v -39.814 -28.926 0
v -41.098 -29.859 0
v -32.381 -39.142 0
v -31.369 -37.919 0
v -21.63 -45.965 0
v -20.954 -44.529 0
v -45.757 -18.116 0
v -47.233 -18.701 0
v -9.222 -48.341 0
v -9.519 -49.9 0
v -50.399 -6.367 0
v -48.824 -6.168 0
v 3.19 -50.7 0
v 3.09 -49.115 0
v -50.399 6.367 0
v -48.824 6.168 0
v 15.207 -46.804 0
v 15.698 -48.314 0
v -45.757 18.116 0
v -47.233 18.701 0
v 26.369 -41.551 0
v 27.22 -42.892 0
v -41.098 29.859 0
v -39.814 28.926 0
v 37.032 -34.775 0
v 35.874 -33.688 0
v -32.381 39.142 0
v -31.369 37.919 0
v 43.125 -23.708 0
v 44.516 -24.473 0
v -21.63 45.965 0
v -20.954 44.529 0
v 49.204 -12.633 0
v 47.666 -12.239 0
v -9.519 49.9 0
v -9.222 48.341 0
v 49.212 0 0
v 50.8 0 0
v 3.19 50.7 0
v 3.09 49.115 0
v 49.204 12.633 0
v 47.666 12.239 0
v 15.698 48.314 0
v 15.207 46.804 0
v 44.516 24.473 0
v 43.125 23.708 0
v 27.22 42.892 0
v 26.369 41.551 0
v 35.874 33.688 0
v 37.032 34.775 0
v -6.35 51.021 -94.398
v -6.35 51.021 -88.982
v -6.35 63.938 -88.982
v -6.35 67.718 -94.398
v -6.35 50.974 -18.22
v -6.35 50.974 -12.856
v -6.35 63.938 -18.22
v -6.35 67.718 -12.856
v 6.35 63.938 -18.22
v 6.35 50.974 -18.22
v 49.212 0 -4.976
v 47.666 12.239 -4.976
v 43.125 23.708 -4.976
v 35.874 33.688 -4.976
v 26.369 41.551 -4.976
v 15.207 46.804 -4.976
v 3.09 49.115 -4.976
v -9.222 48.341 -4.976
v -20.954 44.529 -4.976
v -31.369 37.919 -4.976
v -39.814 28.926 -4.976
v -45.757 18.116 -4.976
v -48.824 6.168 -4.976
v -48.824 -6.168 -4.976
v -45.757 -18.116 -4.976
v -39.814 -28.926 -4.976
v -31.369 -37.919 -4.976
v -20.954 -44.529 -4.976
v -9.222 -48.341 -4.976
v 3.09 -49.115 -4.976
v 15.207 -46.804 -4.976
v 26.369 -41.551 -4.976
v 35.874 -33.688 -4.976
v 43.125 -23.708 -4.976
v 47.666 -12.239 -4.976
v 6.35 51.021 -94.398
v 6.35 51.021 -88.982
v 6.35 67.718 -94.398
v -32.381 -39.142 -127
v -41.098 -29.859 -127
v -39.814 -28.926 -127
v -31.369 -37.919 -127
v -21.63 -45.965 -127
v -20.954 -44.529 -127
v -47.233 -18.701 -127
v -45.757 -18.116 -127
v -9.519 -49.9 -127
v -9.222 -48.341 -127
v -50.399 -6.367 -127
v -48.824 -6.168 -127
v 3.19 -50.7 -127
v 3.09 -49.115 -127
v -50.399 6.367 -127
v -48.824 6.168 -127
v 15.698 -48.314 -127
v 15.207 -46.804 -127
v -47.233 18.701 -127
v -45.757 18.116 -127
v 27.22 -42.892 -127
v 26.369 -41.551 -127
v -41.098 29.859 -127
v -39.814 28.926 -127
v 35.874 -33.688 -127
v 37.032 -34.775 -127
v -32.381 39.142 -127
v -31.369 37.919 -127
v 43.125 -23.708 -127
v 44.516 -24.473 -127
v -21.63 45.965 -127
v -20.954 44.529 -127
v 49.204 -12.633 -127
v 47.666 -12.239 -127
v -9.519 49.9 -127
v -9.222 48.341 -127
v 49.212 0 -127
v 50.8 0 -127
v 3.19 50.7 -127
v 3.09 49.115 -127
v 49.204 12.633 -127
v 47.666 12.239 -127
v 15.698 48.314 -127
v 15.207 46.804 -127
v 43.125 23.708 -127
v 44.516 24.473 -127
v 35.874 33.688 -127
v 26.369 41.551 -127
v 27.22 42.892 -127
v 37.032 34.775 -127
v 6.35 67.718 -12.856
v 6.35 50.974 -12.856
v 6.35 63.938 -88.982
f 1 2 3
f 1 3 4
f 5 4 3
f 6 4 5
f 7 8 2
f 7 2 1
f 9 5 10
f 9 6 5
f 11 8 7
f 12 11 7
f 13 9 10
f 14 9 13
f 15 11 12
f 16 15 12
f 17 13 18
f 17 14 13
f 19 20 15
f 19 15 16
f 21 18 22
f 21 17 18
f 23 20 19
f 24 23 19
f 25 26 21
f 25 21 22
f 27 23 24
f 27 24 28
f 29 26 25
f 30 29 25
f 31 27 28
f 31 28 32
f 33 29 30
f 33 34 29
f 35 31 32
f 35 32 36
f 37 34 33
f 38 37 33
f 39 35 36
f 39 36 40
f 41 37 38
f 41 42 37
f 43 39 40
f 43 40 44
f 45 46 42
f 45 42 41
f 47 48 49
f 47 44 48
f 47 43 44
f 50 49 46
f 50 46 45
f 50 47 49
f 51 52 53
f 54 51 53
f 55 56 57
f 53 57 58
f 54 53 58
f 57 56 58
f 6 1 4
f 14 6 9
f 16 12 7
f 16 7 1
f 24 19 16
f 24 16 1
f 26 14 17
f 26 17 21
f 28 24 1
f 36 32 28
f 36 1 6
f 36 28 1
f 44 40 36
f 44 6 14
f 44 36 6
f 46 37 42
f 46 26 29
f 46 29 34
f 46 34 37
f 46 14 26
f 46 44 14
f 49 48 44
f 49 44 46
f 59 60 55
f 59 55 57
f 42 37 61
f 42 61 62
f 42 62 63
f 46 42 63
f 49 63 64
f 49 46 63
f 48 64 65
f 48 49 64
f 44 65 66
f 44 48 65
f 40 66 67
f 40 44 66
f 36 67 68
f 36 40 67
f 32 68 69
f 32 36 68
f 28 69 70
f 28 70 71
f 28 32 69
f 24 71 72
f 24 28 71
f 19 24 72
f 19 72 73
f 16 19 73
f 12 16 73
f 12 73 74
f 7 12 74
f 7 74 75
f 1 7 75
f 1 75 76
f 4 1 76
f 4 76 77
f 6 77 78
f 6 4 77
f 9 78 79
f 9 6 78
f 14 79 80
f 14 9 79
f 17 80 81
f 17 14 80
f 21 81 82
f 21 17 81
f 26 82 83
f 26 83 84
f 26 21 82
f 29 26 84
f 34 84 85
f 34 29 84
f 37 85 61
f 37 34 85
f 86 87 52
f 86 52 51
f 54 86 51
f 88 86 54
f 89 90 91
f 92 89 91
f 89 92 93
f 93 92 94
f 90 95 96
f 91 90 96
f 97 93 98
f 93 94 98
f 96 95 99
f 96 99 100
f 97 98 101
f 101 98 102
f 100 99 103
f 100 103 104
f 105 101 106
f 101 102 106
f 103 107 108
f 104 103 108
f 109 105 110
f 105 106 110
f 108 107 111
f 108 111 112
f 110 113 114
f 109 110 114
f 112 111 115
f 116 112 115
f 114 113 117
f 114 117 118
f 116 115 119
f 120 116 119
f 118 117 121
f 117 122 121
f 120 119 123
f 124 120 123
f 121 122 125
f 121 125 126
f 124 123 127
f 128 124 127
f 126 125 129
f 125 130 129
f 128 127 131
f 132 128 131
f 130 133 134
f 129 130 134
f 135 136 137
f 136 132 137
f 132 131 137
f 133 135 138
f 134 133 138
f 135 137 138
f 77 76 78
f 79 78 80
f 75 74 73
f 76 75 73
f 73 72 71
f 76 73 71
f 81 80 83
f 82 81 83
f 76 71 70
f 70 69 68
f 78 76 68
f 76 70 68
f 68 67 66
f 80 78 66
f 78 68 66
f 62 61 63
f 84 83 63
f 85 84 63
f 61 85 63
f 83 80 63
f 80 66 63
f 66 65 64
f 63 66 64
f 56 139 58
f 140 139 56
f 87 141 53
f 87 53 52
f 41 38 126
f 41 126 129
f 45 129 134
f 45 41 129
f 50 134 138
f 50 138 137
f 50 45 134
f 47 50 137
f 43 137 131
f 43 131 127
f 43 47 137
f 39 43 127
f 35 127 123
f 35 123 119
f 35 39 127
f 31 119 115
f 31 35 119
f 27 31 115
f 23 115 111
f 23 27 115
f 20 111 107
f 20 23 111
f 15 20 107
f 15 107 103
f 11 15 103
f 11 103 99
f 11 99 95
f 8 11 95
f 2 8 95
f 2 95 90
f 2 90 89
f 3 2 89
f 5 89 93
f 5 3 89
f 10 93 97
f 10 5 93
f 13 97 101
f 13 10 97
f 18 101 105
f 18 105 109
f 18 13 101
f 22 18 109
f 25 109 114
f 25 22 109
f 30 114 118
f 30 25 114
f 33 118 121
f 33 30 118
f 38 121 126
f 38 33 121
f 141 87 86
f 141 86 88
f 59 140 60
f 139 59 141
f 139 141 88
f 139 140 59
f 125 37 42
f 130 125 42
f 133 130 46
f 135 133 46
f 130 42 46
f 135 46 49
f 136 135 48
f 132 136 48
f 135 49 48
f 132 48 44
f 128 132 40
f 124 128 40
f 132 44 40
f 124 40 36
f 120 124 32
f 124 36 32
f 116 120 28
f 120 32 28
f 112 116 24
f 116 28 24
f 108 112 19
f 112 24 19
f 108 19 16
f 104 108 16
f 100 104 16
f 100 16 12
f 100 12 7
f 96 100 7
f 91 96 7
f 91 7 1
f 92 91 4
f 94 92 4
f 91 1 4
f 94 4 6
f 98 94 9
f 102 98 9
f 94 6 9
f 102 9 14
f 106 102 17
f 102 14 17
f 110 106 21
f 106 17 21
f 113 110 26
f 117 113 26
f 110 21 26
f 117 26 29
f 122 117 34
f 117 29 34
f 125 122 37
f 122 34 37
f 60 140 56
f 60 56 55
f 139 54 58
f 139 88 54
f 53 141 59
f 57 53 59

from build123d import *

# Parameters (mm, degrees)
F0_R     = 50.8
F0_R_2   = 49.2125
F1_DEPTH = 127
F2_DEPTH = 4.975986
F3_W     = 3.780454
F3_H     = 70.76213
F4_DEPTH = 6.35


with BuildPart() as f1:
    # F0 (on Top) → F1 (new body)
    with BuildSketch(Plane.XY):
        Circle(F0_R)
        Circle(F0_R_2, mode=Mode.SUBTRACT)
    extrude(amount=-F1_DEPTH)


with BuildPart() as f2:
    # F0 (on Top) → F2 (new body)
    with BuildSketch(Plane.XY):
        Circle(F0_R_2)
    extrude(amount=-F2_DEPTH)


with BuildPart() as f4:
    # F3 (on Right) → F4 (new body, symmetric)
    with BuildSketch(Plane.YZ):
        Polygon((63.937627, -18.21967), (67.718081, -18.21967), (67.718081, -12.85633), (50.973743, -12.85633), (50.973743, -18.21967), align=None)
        with Locations((65.827854, -53.600735)):
            Rectangle(F3_W, F3_H)
        Polygon((67.718081, -94.397597), (67.718081, -88.9818), (63.937627, -88.9818), (51.021233, -88.9818), (51.021233, -94.397597), align=None)
    extrude(amount=F4_DEPTH, both=True)


solid = Compound([f1.part, f2.part, f4.part])
